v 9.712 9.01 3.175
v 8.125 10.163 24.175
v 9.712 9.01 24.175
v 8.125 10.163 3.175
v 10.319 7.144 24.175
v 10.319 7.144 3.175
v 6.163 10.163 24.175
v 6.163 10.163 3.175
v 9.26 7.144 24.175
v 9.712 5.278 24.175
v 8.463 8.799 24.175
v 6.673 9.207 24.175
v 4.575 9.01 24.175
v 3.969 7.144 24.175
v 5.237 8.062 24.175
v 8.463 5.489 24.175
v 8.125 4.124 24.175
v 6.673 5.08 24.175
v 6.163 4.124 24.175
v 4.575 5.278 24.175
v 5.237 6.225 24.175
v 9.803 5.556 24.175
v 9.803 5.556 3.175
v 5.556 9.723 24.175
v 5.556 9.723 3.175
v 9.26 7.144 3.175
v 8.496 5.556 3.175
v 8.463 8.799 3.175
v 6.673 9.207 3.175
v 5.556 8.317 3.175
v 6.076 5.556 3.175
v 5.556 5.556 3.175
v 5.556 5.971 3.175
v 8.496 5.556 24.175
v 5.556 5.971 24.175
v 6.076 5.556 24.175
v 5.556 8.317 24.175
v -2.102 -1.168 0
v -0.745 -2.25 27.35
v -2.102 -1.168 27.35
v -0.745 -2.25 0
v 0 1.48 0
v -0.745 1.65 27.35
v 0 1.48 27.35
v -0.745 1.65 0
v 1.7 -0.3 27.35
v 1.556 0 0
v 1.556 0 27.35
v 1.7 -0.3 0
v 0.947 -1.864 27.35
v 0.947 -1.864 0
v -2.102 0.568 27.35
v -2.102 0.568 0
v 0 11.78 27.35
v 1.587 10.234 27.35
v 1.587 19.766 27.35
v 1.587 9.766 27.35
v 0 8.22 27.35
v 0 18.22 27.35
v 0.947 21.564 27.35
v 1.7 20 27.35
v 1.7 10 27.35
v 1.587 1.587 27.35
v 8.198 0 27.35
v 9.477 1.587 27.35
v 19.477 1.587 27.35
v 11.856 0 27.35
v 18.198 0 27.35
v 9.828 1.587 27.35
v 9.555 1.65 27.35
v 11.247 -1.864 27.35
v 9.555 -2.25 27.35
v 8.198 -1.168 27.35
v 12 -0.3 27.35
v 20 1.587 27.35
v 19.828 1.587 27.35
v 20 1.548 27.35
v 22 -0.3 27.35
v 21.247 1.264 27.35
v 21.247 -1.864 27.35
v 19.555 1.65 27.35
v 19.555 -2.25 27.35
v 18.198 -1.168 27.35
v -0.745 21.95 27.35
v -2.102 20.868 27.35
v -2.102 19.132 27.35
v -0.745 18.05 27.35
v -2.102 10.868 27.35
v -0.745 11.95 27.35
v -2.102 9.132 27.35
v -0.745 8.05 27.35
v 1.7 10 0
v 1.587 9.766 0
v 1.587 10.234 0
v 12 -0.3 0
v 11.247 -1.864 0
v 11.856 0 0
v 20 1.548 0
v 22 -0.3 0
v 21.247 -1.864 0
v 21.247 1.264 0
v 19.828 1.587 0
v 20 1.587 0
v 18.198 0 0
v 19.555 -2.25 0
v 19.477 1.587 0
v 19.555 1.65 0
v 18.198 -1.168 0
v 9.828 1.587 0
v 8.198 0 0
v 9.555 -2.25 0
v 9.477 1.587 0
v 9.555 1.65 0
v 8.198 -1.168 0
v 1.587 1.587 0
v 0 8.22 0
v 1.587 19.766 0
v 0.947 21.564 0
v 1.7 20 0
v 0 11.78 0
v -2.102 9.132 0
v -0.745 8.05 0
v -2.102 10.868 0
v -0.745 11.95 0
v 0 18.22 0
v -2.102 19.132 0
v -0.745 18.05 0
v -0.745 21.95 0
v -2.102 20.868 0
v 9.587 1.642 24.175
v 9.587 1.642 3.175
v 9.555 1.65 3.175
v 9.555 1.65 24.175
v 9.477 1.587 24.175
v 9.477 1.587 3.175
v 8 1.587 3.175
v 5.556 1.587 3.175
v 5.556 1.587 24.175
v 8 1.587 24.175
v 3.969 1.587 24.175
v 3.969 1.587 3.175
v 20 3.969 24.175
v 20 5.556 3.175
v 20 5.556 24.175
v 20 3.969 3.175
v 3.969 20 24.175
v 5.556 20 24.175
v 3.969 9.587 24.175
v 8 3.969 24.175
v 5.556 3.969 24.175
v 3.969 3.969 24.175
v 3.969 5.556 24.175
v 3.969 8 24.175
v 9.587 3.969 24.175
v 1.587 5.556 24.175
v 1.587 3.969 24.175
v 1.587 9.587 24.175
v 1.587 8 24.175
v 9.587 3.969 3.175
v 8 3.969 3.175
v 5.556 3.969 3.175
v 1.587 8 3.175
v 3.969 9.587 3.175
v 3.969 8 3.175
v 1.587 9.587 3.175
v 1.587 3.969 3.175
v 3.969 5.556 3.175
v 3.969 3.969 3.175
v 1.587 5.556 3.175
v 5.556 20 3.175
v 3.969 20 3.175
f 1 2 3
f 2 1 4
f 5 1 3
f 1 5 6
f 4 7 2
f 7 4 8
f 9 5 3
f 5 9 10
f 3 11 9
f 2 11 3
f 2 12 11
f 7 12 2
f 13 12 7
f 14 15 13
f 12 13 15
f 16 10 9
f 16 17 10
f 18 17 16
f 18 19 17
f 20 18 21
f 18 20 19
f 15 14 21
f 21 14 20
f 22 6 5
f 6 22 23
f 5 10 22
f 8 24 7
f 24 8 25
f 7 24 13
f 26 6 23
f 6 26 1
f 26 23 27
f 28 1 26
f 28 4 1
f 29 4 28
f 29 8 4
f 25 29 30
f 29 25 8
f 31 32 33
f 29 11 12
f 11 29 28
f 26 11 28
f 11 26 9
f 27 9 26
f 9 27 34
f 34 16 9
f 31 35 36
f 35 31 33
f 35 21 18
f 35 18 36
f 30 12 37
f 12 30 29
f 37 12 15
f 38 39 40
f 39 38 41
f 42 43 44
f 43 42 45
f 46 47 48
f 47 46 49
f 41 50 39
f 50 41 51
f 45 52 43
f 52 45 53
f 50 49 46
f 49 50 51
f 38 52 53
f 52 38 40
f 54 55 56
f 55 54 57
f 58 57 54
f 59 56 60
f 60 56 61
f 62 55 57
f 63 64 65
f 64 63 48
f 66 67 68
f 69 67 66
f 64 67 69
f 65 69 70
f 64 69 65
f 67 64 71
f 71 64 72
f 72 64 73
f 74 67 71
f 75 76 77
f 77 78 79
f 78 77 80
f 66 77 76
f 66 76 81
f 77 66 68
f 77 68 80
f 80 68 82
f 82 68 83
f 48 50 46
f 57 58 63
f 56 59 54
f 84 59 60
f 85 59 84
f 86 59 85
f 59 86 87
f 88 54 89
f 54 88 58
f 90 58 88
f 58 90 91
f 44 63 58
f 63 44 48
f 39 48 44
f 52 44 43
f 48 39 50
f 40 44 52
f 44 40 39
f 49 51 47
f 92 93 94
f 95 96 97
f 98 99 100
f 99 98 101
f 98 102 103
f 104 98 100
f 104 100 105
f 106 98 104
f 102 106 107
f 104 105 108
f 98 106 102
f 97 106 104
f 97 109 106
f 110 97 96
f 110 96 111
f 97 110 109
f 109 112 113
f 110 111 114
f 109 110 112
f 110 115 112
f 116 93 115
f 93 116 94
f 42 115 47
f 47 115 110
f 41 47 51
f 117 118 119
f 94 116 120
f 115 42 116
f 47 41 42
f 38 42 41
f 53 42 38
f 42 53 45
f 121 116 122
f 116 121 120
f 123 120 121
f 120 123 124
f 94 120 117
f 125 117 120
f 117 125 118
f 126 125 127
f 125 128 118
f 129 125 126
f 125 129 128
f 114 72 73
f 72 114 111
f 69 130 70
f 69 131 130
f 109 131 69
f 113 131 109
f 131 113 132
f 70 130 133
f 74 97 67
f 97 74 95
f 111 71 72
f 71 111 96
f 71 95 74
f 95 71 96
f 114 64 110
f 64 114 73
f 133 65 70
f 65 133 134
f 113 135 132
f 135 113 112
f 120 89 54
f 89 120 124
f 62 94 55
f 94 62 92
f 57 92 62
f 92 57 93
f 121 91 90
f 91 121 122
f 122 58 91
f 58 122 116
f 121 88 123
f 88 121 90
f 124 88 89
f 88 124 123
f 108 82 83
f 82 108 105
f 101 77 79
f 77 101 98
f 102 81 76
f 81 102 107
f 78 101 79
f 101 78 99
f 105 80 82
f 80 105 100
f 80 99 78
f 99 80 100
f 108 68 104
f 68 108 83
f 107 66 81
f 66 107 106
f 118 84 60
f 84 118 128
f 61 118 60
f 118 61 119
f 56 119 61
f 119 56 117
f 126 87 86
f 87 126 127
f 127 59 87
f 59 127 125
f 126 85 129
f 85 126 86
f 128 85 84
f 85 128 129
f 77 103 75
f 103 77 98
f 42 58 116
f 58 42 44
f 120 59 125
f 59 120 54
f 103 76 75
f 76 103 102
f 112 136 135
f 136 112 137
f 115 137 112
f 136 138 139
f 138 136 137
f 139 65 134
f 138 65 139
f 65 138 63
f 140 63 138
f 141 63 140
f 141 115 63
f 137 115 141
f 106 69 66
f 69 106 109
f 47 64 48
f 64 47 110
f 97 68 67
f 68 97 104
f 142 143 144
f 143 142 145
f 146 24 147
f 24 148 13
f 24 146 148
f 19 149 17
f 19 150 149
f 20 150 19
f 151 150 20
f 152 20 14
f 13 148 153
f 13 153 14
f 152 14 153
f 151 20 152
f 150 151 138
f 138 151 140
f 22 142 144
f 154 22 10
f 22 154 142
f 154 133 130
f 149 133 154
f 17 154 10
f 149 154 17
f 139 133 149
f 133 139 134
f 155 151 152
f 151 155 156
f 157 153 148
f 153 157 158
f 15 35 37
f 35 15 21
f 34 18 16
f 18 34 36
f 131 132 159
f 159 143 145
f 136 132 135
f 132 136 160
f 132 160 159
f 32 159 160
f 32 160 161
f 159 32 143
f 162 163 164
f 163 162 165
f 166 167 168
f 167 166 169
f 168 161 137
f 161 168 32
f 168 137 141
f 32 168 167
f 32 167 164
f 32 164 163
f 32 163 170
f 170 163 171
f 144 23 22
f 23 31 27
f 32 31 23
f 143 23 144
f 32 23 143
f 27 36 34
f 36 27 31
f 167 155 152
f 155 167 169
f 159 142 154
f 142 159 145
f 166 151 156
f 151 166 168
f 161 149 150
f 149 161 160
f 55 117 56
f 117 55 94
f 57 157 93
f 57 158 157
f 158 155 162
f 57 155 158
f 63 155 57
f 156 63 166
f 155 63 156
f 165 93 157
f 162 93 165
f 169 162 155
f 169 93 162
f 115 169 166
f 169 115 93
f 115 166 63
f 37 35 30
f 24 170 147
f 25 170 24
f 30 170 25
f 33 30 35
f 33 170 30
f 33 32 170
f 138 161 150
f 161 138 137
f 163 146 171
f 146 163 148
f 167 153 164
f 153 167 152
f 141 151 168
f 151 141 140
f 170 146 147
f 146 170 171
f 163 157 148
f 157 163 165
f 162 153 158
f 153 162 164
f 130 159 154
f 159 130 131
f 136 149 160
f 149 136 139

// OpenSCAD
// file: v2/corner.scad
/**
 * corner.scad is part of Paper Laptop project.
 *
 * @author R. S. Doiel, <rsdoiel@gmail.com>
 * copyright (c) 2016 all rights reserved
 * Released under a BSD 2-clause license
 */

/*
# misc notes

|  Inches   | Inches    |  Millimeters |
|(fraction) | (decimal) |              |
+-----------+-----------+--------------+
|    1/16   |    0.0625 | 1.5875       |
|    1/8    |    0.125  | 3.175        |
|    3/16   |    0.1875 | 4.7625       |
|    1/4    |    0.25   | 6.35         |
|    3/8    |    0.375  | 9.525        |
|    1/2    |    0.5    | 12.7         |
|    5/8    |    0.625  | 15.875       |
|    3/4    |    0.75   | 19.05        |
|    7/8    |    0.875  | 22.225       |
|    1      |    1.0    | 25.4         |

## Raspberry Pi Dimensions

85.60mm x 56mm x 21mm
(or roughly 3.37″ x 2.21″ x 0.83″)

 */

 /*
  * Corner: case corners, units assumed is 1mm
  */
module Corner() {
    // sizing and spacing
    t = 3.175;// Aprox. 1/8 inch.
    side_t = t/2;
    side_l = 20;
    b_spacing = side_l/2;
    inner_h = 21;
    inner_t = t*1.25;
    outer_t = side_t;
    outer_h = inner_h+(2*t);
    bump_r = 2;
    bump_o = -0.3;

    // main fastening surface
    translate([t*2.25, t*2.25, t]) {
        difference() {
            // fastener body
            color([1,0,0]) cylinder(h=inner_h, r=t, center=false);
            // bolt hole
            color([0,0,0]) cylinder(h=inner_h, r=t/1.5, center=false);
        }
    }

    // corner bumper
    translate([bump_o, bump_o, 0]) {
        color([1,0,0]) cylinder(h=outer_h, r=bump_r, center=false);
    }

    // middle bumpers side a
    translate([b_spacing, bump_o, 0]) {
        color([1,0,0]) cylinder(h=outer_h, r=bump_r, center=false);
    }

    // middle bumpers side b
    translate([bump_o, b_spacing, 0]) {
        color([1,0,0]) cylinder(h=outer_h, r=bump_r, center=false);
    }

    // end bumpers
    translate([side_l, bump_o, 0]) {
        color([1,0,0]) cylinder(h=outer_h, r=bump_r, center=false);
    }
    translate([bump_o, side_l, 0]) {
        color([1,0,0]) cylinder(h=outer_h, r=bump_r, center=false);
    }

    // outer side a
    translate([0, 0, 0]) {
       color([0,1,0]) cube([side_l, side_t, outer_h], center=false);
    }

    // Inner side a
    translate([0, t*1.25, t]) {
       color([0,1,0]) cube([side_l, side_t, inner_h], center=false);
    }

    // outer side b
    translate([0, 0, 0]) {
       color([0,1,0]) cube([side_t, side_l, outer_h], center=false);
    }

    // Inner side b
    translate([t*1.25, 0, t]) {
       color([0,1,0]) cube([side_t, side_l, inner_h], center=false);
    }

    // filler corner
    translate([1, 8, t]) {
       color([0,0, 1]) cube([inner_t, outer_t, inner_h], center=false);
    }
    translate([8, 1, t]) {
       color([0,0, 1]) cube([outer_t, inner_t, inner_h], center=false);
    }
}
// main file
/**
 * test-corner.scad is part of Paper Laptop project.
 *
 * @author R. S. Doiel, <rsdoiel@gmail.com>
 * copyright (c) 2016 all rights reserved
 * Released under a BSD 2-clause license
 */
include <v2/corner.scad>

Corner();
